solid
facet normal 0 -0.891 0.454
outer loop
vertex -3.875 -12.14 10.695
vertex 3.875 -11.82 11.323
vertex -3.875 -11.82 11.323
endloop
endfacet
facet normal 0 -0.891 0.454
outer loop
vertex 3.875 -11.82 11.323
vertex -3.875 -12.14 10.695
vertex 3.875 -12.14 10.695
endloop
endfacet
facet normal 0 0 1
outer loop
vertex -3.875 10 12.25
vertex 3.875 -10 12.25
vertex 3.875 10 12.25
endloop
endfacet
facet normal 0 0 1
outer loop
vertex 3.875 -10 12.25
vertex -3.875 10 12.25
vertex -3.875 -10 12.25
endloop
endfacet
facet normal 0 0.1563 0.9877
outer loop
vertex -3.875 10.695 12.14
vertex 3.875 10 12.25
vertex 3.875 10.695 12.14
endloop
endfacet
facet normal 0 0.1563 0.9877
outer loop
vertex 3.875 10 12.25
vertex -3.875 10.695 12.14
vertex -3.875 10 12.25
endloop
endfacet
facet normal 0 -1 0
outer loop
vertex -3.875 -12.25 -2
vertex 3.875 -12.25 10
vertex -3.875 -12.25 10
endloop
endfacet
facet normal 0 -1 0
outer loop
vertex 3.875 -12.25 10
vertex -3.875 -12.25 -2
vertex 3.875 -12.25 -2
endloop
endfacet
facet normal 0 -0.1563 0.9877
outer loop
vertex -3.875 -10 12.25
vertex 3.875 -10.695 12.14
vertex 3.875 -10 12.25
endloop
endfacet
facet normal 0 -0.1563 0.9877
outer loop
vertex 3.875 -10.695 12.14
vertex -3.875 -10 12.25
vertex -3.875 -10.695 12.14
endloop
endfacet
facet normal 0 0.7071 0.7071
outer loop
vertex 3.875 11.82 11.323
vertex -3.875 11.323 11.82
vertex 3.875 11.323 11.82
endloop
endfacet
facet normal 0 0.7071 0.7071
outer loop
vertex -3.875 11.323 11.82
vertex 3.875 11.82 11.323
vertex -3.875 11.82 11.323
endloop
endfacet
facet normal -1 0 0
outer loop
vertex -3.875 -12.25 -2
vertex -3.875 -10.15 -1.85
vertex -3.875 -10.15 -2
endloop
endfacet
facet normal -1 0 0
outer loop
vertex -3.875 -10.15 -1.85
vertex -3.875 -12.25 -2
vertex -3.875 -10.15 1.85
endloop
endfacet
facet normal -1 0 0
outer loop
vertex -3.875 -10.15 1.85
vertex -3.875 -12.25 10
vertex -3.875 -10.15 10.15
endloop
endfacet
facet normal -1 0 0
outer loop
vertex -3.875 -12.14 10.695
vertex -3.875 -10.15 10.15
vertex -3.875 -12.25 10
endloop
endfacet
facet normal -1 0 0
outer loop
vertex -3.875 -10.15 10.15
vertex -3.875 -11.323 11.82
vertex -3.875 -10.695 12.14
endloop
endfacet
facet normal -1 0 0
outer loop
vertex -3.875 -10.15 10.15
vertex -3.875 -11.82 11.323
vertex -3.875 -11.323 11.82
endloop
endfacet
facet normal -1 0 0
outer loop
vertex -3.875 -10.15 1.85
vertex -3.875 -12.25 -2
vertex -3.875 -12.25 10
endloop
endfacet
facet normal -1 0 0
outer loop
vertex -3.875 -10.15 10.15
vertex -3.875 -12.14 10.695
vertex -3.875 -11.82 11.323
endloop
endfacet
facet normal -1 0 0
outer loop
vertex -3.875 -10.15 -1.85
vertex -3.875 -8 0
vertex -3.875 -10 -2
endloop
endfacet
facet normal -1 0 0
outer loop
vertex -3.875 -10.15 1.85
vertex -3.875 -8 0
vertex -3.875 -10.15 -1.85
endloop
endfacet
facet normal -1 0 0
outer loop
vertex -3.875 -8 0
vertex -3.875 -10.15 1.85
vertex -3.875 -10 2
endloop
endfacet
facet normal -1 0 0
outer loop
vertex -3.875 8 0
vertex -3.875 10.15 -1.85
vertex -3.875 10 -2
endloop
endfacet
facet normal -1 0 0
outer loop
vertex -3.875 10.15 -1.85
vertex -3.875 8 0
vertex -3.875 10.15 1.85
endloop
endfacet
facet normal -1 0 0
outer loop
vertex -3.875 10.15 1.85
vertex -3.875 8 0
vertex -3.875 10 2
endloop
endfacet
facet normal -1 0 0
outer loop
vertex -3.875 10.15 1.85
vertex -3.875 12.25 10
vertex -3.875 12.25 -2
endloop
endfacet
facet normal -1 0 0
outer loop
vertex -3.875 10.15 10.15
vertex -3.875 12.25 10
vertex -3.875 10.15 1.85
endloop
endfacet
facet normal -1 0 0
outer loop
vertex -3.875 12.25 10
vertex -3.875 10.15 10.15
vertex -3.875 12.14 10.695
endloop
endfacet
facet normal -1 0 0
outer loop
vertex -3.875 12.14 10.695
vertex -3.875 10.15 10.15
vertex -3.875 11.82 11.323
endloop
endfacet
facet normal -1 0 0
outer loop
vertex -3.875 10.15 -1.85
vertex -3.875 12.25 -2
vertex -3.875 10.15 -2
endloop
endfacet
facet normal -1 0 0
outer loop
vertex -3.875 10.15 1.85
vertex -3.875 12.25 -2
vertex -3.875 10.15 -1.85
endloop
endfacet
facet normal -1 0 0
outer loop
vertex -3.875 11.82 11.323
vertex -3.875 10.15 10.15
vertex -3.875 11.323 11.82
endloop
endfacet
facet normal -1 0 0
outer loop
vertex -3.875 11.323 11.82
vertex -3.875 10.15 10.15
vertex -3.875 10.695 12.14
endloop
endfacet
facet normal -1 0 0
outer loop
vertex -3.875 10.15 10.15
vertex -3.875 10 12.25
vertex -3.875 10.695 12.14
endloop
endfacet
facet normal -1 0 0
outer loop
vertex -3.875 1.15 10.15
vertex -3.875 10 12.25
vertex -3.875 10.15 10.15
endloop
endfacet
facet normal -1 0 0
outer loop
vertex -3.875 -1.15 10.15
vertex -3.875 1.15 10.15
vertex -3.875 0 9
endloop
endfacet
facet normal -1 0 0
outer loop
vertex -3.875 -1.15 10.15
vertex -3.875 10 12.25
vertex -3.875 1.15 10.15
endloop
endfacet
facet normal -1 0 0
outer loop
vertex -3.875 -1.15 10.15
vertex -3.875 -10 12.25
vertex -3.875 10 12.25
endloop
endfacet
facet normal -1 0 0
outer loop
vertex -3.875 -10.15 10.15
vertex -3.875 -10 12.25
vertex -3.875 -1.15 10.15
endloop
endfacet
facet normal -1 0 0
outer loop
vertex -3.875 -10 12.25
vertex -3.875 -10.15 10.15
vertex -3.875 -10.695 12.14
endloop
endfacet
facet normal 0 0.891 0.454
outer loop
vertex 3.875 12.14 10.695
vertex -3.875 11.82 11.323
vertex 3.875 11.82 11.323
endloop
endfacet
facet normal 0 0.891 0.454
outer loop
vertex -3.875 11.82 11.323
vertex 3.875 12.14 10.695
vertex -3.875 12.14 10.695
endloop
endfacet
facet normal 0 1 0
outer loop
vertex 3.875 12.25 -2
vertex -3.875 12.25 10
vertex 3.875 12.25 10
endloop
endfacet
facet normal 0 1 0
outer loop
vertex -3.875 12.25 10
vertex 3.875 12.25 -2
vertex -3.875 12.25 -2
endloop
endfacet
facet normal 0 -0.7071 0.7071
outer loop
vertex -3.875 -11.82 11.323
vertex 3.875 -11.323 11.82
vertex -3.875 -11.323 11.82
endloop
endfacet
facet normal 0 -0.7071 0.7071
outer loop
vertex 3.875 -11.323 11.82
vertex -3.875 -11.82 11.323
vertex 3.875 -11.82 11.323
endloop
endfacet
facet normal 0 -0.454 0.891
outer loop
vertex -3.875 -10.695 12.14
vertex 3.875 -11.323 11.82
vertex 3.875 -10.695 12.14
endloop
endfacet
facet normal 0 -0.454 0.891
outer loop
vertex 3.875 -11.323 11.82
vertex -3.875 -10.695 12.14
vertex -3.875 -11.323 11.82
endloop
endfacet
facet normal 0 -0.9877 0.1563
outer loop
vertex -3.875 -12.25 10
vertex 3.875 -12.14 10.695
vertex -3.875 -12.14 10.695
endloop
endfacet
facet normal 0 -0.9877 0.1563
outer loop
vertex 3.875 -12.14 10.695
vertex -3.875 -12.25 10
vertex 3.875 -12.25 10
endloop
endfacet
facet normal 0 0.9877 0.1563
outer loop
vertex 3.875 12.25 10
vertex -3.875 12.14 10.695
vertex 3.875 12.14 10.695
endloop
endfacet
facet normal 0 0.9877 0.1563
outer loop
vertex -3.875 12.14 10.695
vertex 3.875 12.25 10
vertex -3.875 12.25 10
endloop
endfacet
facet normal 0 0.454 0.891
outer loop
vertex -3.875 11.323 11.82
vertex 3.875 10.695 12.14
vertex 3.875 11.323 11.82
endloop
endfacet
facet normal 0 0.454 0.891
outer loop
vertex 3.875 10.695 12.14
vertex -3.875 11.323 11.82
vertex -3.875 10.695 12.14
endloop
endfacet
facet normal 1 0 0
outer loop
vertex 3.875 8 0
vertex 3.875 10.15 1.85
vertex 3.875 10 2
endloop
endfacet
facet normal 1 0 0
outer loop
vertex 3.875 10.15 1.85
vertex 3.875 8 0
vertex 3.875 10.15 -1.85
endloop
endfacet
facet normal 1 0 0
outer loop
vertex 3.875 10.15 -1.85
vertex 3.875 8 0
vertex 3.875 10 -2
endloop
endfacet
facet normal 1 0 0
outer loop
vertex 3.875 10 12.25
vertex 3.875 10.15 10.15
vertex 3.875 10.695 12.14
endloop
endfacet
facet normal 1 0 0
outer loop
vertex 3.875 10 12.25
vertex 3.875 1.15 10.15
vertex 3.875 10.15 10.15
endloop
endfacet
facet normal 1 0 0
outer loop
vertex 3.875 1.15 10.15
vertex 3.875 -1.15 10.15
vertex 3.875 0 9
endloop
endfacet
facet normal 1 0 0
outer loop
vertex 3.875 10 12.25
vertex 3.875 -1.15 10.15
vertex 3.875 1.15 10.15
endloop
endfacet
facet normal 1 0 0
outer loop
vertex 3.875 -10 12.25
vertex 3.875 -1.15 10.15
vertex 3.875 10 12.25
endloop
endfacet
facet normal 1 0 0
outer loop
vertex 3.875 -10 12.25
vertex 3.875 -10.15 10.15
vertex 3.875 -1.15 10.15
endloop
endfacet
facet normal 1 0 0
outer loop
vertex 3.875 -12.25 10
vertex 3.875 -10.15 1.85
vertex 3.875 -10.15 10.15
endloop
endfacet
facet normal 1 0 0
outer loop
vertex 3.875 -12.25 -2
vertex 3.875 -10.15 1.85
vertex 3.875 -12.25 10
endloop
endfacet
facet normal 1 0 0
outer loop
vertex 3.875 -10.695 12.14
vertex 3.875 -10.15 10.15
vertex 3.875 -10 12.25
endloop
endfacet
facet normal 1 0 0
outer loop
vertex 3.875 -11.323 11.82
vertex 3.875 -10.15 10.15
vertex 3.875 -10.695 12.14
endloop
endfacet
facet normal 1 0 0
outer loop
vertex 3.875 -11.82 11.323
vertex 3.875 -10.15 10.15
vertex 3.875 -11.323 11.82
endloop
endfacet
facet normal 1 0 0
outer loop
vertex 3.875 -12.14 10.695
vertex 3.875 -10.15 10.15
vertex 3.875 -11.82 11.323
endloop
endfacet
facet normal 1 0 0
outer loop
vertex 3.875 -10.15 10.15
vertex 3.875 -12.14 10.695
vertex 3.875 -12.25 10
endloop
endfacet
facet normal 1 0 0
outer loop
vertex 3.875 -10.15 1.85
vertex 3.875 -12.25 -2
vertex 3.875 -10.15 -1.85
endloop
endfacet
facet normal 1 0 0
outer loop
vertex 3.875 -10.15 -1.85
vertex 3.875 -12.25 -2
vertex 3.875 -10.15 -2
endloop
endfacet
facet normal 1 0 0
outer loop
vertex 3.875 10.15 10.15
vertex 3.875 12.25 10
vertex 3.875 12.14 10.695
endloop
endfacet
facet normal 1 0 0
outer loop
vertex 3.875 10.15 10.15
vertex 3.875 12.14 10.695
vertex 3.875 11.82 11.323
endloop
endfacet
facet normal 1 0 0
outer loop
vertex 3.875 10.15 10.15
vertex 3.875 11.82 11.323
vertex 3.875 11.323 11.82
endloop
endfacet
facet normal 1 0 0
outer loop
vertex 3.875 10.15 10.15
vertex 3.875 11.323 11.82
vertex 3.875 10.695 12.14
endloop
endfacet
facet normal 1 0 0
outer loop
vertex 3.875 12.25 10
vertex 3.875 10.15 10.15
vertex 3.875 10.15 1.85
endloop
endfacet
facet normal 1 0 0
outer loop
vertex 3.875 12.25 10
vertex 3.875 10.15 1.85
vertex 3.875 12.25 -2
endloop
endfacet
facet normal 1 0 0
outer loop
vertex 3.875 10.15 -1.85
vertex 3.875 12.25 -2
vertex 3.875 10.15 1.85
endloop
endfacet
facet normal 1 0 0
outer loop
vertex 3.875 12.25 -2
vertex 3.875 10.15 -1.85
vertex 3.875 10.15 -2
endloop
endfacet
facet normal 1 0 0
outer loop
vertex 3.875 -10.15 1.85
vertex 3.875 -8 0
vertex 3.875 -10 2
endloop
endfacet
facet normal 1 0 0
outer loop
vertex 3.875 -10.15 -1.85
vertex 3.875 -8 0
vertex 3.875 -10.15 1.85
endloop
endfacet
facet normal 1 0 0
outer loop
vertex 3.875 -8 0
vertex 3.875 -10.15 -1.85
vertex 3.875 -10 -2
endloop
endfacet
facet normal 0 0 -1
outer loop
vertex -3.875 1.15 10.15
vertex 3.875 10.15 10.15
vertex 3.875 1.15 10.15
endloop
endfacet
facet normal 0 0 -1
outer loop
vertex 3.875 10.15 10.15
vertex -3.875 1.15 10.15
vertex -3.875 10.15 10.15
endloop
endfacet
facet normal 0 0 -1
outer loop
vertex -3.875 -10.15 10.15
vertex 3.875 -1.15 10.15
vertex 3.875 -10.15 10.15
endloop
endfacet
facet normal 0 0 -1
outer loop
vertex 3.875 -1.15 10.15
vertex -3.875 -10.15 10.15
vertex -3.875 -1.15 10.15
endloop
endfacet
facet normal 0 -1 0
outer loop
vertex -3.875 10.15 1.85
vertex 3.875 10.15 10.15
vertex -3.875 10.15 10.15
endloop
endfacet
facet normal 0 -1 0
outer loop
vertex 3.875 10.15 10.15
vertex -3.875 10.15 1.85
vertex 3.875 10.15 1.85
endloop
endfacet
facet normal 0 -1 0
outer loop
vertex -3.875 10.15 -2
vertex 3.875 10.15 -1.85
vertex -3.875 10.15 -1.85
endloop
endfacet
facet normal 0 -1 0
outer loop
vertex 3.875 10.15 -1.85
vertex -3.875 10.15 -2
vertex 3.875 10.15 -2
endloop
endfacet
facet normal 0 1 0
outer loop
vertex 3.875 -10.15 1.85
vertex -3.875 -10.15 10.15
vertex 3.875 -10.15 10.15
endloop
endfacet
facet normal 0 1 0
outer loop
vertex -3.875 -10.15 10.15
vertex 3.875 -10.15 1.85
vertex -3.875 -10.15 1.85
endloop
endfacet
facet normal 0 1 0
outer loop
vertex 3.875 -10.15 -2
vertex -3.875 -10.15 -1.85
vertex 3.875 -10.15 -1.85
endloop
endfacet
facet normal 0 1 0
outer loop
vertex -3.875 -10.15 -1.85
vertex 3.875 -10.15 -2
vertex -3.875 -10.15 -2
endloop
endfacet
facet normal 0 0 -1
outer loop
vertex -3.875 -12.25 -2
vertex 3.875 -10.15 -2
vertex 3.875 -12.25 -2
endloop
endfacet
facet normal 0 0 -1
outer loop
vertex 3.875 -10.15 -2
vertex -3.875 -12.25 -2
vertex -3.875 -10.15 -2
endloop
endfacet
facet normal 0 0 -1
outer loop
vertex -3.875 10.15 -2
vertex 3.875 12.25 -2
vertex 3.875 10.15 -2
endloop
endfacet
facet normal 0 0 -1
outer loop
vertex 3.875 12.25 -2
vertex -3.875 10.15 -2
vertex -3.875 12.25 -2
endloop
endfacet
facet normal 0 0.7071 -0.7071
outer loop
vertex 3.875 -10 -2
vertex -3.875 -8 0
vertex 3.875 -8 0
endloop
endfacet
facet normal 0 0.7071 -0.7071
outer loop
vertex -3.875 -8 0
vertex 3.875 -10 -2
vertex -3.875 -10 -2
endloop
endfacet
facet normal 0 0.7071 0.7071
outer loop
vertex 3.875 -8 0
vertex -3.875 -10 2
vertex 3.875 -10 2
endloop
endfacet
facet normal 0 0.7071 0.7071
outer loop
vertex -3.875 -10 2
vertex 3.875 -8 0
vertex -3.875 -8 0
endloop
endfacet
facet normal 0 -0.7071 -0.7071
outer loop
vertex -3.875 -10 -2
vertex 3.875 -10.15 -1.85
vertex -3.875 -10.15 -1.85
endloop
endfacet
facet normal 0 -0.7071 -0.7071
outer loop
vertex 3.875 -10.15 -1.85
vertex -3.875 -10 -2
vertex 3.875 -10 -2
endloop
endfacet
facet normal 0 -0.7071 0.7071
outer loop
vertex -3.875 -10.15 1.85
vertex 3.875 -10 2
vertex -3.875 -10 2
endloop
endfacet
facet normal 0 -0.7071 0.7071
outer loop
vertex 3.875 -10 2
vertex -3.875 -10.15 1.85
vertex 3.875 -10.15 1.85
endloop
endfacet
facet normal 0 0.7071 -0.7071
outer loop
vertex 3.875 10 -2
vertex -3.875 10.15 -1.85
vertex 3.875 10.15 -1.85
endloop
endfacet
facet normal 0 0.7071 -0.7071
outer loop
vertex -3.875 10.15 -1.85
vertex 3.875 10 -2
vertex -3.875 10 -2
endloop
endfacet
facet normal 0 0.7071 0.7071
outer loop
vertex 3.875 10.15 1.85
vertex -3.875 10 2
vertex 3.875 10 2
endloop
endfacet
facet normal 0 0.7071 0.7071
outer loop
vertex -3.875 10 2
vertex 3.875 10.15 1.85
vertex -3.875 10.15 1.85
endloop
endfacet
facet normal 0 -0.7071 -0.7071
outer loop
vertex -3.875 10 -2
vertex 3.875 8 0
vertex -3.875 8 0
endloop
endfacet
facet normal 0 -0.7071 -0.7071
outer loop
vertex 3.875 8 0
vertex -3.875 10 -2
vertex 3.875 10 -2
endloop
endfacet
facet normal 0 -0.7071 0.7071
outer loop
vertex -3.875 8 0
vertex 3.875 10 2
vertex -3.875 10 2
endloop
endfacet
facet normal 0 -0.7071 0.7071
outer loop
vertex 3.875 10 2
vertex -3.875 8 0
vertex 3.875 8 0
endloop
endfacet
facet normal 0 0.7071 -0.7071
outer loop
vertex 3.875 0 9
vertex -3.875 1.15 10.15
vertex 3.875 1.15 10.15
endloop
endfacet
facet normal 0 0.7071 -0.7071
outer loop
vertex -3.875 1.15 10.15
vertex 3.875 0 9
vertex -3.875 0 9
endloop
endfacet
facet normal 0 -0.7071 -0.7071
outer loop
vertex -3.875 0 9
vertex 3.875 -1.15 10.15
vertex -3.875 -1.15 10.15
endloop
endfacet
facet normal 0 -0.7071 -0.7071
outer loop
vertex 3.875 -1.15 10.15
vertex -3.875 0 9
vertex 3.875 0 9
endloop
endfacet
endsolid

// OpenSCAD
thick=2.25;
err=0.3;
module wireHidder(){
    union(){
	difference(){
	    minkowski(){
		cube([thick*3,20,20],center=true);
		rotate([0,90,0])cylinder(r=thick, h=1, center=true, $fn=20);
	    }
	    cube([thick*3.5,20+err,20+err],center=true);
	    translate([0,0,-17])cube([thick*5, 30, 30], center=true);
	}

	translate([0,-10,0])rotate([0,90,0])cylinder(r=2,h=thick*3+1,center=true,$fn=4);
	translate([0,10,0])rotate([0,90,0])cylinder(r=2,h=thick*3+1,center=true,$fn=4);
	translate([0,0,10.5])rotate([0,90,0])cylinder(r=1.5,h=thick*3+1,center=true,$fn=4);
    }
    
}

wireHidder();
